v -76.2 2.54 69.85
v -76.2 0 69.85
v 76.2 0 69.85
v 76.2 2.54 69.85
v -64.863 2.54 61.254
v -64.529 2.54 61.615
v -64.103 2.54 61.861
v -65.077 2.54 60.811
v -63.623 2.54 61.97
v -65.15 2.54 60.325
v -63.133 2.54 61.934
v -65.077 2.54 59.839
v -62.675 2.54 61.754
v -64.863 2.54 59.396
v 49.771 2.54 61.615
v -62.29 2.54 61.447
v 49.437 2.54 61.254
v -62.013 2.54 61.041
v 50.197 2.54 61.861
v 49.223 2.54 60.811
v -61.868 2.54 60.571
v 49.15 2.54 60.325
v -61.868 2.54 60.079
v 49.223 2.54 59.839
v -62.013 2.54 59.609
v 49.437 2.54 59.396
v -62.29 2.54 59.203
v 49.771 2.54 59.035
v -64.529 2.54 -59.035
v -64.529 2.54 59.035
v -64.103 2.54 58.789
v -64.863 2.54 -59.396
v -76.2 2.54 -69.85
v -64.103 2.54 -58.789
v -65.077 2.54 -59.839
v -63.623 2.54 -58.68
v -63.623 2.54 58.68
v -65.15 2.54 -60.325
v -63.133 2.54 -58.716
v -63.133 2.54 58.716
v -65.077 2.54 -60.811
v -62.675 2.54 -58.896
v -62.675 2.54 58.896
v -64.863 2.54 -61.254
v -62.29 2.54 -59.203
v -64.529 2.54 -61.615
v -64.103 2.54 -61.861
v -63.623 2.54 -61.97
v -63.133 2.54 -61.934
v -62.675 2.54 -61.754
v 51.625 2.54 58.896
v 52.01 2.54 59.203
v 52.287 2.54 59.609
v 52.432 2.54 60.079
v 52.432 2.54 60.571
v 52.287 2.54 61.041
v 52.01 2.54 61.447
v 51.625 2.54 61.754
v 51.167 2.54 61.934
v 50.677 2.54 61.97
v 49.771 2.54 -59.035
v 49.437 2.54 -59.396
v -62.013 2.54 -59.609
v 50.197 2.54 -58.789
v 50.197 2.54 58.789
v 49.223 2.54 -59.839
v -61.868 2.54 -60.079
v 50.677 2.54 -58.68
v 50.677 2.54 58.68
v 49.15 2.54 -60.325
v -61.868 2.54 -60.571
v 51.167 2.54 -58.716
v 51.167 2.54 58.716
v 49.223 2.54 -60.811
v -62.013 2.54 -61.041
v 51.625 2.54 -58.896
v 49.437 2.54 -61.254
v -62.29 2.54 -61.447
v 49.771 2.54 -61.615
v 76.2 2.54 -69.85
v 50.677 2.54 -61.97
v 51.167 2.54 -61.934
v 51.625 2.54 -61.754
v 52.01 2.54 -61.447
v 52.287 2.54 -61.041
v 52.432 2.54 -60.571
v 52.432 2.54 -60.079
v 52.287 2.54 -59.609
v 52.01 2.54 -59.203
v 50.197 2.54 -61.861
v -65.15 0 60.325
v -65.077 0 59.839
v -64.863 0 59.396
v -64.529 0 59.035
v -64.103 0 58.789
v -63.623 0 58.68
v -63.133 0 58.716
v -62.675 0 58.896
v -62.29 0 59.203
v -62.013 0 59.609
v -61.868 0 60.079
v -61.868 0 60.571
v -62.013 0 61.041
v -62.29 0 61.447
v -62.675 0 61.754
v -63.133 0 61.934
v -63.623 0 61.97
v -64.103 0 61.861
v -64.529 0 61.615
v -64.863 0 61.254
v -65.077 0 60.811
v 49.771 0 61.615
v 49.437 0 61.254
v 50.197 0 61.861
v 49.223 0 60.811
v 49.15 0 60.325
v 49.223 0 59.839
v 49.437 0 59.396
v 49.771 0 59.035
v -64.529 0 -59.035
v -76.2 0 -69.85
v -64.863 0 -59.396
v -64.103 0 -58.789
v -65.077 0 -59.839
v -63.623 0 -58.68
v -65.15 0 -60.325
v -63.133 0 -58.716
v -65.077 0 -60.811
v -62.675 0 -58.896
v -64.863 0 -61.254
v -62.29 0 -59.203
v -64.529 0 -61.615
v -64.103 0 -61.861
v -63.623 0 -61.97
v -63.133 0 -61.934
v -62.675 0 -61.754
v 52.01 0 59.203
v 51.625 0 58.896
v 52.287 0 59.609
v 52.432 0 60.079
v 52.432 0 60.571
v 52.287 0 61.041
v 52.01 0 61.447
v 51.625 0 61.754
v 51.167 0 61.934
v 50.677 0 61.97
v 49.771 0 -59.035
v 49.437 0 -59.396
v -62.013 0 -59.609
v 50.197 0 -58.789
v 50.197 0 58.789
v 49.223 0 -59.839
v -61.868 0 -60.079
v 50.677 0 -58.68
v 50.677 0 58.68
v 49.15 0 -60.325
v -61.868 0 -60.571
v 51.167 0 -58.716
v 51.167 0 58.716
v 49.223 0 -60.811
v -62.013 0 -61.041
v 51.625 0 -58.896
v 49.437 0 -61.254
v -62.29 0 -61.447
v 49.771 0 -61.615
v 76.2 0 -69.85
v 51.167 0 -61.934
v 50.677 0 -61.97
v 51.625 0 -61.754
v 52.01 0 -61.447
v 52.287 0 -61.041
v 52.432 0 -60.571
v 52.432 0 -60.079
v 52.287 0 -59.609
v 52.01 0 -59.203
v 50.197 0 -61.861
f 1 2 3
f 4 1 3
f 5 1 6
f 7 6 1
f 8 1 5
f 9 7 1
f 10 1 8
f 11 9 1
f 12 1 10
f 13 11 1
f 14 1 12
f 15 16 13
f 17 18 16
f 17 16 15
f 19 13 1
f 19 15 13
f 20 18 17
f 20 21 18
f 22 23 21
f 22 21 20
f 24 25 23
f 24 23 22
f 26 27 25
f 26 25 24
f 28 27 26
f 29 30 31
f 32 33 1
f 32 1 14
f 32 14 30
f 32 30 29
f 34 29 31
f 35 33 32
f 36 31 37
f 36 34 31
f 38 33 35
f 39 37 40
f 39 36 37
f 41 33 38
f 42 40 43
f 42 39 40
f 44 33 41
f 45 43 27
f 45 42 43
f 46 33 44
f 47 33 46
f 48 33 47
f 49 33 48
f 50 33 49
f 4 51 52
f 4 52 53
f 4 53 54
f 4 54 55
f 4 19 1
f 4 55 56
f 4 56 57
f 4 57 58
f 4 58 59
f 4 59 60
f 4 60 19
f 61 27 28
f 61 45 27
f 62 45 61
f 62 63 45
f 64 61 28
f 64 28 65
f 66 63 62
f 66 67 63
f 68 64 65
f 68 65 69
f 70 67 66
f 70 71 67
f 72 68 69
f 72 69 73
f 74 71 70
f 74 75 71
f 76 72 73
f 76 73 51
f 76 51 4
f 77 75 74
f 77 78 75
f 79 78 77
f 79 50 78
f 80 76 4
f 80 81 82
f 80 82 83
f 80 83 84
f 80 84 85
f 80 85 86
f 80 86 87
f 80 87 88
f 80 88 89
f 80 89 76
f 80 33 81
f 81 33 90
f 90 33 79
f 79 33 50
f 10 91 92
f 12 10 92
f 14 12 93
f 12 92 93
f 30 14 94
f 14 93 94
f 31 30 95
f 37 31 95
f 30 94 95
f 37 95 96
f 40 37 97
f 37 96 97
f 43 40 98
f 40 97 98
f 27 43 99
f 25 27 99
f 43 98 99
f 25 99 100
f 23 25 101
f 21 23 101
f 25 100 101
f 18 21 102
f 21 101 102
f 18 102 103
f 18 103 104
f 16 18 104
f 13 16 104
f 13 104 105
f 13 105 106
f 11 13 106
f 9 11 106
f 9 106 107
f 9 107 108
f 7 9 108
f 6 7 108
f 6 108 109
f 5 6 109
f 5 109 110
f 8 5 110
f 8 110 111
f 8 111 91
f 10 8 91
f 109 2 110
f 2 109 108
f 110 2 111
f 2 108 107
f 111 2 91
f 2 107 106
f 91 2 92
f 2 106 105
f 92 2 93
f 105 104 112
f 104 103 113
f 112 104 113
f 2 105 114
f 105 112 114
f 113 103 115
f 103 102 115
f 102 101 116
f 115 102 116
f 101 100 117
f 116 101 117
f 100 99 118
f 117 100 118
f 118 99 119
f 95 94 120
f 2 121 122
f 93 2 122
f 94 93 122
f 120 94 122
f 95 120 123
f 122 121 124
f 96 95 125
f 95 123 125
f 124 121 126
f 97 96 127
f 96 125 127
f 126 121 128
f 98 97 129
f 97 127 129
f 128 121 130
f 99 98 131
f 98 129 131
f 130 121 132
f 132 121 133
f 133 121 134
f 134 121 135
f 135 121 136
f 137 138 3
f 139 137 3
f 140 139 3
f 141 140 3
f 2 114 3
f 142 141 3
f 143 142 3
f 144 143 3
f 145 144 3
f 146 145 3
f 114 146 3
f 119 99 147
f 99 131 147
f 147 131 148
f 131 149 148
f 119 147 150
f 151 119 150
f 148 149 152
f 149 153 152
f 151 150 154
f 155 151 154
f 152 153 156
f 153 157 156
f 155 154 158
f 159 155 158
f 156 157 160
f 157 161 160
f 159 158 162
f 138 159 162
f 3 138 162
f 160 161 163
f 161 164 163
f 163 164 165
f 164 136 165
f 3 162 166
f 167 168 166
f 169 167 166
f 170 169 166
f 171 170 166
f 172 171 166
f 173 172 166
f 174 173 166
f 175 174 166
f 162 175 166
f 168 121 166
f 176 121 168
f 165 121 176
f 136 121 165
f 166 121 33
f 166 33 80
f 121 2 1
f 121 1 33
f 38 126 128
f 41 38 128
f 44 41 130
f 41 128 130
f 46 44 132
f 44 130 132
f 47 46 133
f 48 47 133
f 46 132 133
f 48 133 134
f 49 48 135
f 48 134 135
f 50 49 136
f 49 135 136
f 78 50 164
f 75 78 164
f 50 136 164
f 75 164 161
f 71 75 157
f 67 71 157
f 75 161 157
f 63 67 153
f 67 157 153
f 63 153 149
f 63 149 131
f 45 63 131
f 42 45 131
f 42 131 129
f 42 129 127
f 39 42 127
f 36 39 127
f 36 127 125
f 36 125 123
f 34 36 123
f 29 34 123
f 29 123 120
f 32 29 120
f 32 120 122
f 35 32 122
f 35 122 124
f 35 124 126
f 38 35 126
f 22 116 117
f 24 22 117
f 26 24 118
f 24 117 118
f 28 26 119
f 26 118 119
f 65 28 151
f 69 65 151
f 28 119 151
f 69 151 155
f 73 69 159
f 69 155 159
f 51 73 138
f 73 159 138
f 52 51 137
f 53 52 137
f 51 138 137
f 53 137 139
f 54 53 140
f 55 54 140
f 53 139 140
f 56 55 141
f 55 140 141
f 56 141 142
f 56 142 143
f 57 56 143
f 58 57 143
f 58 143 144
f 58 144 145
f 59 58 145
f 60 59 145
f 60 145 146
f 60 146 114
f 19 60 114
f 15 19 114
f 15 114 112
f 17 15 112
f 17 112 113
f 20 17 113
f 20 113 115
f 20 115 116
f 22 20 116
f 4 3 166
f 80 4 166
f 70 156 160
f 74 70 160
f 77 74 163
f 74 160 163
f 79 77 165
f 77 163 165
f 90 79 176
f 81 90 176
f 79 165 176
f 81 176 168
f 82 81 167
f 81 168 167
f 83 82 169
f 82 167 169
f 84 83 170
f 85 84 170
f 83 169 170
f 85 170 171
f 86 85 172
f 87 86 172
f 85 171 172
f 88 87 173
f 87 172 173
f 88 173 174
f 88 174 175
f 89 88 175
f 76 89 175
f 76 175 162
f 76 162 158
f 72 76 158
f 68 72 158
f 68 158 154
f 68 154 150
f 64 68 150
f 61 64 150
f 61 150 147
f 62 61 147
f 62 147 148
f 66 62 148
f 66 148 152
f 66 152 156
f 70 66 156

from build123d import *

# Parameters (mm, degrees)
SKETCH1_W                 = 152.4
SKETCH1_H                 = 139.7
BOSS_EXTRUDE1_DEPTH       = 2.54
M4X0_7_TAPPED_HOLE1_D     = 3.3
M4X0_7_TAPPED_HOLE1_DEPTH = 9.906


with BuildPart() as part:
    # Sketch1 → Boss-Extrude1 (new body)
    with BuildSketch(Plane(origin=(0, 0, 0), x_dir=(1, 0, 0), z_dir=(0, 1, 0))):
        Rectangle(SKETCH1_W, SKETCH1_H)
    extrude(amount=BOSS_EXTRUDE1_DEPTH)

    # M4x0.7 Tapped Hole1
    with Locations(Plane(origin=(0, 2.54, 0), x_dir=(1, 0, 0), z_dir=(0, 1, 0))):
        with Locations((-63.5, 60.325), (-63.5, -60.325), (50.8, -60.325), (50.8, 60.325)):
            Hole(M4X0_7_TAPPED_HOLE1_D / 2, depth=M4X0_7_TAPPED_HOLE1_DEPTH)


solid = part.part
